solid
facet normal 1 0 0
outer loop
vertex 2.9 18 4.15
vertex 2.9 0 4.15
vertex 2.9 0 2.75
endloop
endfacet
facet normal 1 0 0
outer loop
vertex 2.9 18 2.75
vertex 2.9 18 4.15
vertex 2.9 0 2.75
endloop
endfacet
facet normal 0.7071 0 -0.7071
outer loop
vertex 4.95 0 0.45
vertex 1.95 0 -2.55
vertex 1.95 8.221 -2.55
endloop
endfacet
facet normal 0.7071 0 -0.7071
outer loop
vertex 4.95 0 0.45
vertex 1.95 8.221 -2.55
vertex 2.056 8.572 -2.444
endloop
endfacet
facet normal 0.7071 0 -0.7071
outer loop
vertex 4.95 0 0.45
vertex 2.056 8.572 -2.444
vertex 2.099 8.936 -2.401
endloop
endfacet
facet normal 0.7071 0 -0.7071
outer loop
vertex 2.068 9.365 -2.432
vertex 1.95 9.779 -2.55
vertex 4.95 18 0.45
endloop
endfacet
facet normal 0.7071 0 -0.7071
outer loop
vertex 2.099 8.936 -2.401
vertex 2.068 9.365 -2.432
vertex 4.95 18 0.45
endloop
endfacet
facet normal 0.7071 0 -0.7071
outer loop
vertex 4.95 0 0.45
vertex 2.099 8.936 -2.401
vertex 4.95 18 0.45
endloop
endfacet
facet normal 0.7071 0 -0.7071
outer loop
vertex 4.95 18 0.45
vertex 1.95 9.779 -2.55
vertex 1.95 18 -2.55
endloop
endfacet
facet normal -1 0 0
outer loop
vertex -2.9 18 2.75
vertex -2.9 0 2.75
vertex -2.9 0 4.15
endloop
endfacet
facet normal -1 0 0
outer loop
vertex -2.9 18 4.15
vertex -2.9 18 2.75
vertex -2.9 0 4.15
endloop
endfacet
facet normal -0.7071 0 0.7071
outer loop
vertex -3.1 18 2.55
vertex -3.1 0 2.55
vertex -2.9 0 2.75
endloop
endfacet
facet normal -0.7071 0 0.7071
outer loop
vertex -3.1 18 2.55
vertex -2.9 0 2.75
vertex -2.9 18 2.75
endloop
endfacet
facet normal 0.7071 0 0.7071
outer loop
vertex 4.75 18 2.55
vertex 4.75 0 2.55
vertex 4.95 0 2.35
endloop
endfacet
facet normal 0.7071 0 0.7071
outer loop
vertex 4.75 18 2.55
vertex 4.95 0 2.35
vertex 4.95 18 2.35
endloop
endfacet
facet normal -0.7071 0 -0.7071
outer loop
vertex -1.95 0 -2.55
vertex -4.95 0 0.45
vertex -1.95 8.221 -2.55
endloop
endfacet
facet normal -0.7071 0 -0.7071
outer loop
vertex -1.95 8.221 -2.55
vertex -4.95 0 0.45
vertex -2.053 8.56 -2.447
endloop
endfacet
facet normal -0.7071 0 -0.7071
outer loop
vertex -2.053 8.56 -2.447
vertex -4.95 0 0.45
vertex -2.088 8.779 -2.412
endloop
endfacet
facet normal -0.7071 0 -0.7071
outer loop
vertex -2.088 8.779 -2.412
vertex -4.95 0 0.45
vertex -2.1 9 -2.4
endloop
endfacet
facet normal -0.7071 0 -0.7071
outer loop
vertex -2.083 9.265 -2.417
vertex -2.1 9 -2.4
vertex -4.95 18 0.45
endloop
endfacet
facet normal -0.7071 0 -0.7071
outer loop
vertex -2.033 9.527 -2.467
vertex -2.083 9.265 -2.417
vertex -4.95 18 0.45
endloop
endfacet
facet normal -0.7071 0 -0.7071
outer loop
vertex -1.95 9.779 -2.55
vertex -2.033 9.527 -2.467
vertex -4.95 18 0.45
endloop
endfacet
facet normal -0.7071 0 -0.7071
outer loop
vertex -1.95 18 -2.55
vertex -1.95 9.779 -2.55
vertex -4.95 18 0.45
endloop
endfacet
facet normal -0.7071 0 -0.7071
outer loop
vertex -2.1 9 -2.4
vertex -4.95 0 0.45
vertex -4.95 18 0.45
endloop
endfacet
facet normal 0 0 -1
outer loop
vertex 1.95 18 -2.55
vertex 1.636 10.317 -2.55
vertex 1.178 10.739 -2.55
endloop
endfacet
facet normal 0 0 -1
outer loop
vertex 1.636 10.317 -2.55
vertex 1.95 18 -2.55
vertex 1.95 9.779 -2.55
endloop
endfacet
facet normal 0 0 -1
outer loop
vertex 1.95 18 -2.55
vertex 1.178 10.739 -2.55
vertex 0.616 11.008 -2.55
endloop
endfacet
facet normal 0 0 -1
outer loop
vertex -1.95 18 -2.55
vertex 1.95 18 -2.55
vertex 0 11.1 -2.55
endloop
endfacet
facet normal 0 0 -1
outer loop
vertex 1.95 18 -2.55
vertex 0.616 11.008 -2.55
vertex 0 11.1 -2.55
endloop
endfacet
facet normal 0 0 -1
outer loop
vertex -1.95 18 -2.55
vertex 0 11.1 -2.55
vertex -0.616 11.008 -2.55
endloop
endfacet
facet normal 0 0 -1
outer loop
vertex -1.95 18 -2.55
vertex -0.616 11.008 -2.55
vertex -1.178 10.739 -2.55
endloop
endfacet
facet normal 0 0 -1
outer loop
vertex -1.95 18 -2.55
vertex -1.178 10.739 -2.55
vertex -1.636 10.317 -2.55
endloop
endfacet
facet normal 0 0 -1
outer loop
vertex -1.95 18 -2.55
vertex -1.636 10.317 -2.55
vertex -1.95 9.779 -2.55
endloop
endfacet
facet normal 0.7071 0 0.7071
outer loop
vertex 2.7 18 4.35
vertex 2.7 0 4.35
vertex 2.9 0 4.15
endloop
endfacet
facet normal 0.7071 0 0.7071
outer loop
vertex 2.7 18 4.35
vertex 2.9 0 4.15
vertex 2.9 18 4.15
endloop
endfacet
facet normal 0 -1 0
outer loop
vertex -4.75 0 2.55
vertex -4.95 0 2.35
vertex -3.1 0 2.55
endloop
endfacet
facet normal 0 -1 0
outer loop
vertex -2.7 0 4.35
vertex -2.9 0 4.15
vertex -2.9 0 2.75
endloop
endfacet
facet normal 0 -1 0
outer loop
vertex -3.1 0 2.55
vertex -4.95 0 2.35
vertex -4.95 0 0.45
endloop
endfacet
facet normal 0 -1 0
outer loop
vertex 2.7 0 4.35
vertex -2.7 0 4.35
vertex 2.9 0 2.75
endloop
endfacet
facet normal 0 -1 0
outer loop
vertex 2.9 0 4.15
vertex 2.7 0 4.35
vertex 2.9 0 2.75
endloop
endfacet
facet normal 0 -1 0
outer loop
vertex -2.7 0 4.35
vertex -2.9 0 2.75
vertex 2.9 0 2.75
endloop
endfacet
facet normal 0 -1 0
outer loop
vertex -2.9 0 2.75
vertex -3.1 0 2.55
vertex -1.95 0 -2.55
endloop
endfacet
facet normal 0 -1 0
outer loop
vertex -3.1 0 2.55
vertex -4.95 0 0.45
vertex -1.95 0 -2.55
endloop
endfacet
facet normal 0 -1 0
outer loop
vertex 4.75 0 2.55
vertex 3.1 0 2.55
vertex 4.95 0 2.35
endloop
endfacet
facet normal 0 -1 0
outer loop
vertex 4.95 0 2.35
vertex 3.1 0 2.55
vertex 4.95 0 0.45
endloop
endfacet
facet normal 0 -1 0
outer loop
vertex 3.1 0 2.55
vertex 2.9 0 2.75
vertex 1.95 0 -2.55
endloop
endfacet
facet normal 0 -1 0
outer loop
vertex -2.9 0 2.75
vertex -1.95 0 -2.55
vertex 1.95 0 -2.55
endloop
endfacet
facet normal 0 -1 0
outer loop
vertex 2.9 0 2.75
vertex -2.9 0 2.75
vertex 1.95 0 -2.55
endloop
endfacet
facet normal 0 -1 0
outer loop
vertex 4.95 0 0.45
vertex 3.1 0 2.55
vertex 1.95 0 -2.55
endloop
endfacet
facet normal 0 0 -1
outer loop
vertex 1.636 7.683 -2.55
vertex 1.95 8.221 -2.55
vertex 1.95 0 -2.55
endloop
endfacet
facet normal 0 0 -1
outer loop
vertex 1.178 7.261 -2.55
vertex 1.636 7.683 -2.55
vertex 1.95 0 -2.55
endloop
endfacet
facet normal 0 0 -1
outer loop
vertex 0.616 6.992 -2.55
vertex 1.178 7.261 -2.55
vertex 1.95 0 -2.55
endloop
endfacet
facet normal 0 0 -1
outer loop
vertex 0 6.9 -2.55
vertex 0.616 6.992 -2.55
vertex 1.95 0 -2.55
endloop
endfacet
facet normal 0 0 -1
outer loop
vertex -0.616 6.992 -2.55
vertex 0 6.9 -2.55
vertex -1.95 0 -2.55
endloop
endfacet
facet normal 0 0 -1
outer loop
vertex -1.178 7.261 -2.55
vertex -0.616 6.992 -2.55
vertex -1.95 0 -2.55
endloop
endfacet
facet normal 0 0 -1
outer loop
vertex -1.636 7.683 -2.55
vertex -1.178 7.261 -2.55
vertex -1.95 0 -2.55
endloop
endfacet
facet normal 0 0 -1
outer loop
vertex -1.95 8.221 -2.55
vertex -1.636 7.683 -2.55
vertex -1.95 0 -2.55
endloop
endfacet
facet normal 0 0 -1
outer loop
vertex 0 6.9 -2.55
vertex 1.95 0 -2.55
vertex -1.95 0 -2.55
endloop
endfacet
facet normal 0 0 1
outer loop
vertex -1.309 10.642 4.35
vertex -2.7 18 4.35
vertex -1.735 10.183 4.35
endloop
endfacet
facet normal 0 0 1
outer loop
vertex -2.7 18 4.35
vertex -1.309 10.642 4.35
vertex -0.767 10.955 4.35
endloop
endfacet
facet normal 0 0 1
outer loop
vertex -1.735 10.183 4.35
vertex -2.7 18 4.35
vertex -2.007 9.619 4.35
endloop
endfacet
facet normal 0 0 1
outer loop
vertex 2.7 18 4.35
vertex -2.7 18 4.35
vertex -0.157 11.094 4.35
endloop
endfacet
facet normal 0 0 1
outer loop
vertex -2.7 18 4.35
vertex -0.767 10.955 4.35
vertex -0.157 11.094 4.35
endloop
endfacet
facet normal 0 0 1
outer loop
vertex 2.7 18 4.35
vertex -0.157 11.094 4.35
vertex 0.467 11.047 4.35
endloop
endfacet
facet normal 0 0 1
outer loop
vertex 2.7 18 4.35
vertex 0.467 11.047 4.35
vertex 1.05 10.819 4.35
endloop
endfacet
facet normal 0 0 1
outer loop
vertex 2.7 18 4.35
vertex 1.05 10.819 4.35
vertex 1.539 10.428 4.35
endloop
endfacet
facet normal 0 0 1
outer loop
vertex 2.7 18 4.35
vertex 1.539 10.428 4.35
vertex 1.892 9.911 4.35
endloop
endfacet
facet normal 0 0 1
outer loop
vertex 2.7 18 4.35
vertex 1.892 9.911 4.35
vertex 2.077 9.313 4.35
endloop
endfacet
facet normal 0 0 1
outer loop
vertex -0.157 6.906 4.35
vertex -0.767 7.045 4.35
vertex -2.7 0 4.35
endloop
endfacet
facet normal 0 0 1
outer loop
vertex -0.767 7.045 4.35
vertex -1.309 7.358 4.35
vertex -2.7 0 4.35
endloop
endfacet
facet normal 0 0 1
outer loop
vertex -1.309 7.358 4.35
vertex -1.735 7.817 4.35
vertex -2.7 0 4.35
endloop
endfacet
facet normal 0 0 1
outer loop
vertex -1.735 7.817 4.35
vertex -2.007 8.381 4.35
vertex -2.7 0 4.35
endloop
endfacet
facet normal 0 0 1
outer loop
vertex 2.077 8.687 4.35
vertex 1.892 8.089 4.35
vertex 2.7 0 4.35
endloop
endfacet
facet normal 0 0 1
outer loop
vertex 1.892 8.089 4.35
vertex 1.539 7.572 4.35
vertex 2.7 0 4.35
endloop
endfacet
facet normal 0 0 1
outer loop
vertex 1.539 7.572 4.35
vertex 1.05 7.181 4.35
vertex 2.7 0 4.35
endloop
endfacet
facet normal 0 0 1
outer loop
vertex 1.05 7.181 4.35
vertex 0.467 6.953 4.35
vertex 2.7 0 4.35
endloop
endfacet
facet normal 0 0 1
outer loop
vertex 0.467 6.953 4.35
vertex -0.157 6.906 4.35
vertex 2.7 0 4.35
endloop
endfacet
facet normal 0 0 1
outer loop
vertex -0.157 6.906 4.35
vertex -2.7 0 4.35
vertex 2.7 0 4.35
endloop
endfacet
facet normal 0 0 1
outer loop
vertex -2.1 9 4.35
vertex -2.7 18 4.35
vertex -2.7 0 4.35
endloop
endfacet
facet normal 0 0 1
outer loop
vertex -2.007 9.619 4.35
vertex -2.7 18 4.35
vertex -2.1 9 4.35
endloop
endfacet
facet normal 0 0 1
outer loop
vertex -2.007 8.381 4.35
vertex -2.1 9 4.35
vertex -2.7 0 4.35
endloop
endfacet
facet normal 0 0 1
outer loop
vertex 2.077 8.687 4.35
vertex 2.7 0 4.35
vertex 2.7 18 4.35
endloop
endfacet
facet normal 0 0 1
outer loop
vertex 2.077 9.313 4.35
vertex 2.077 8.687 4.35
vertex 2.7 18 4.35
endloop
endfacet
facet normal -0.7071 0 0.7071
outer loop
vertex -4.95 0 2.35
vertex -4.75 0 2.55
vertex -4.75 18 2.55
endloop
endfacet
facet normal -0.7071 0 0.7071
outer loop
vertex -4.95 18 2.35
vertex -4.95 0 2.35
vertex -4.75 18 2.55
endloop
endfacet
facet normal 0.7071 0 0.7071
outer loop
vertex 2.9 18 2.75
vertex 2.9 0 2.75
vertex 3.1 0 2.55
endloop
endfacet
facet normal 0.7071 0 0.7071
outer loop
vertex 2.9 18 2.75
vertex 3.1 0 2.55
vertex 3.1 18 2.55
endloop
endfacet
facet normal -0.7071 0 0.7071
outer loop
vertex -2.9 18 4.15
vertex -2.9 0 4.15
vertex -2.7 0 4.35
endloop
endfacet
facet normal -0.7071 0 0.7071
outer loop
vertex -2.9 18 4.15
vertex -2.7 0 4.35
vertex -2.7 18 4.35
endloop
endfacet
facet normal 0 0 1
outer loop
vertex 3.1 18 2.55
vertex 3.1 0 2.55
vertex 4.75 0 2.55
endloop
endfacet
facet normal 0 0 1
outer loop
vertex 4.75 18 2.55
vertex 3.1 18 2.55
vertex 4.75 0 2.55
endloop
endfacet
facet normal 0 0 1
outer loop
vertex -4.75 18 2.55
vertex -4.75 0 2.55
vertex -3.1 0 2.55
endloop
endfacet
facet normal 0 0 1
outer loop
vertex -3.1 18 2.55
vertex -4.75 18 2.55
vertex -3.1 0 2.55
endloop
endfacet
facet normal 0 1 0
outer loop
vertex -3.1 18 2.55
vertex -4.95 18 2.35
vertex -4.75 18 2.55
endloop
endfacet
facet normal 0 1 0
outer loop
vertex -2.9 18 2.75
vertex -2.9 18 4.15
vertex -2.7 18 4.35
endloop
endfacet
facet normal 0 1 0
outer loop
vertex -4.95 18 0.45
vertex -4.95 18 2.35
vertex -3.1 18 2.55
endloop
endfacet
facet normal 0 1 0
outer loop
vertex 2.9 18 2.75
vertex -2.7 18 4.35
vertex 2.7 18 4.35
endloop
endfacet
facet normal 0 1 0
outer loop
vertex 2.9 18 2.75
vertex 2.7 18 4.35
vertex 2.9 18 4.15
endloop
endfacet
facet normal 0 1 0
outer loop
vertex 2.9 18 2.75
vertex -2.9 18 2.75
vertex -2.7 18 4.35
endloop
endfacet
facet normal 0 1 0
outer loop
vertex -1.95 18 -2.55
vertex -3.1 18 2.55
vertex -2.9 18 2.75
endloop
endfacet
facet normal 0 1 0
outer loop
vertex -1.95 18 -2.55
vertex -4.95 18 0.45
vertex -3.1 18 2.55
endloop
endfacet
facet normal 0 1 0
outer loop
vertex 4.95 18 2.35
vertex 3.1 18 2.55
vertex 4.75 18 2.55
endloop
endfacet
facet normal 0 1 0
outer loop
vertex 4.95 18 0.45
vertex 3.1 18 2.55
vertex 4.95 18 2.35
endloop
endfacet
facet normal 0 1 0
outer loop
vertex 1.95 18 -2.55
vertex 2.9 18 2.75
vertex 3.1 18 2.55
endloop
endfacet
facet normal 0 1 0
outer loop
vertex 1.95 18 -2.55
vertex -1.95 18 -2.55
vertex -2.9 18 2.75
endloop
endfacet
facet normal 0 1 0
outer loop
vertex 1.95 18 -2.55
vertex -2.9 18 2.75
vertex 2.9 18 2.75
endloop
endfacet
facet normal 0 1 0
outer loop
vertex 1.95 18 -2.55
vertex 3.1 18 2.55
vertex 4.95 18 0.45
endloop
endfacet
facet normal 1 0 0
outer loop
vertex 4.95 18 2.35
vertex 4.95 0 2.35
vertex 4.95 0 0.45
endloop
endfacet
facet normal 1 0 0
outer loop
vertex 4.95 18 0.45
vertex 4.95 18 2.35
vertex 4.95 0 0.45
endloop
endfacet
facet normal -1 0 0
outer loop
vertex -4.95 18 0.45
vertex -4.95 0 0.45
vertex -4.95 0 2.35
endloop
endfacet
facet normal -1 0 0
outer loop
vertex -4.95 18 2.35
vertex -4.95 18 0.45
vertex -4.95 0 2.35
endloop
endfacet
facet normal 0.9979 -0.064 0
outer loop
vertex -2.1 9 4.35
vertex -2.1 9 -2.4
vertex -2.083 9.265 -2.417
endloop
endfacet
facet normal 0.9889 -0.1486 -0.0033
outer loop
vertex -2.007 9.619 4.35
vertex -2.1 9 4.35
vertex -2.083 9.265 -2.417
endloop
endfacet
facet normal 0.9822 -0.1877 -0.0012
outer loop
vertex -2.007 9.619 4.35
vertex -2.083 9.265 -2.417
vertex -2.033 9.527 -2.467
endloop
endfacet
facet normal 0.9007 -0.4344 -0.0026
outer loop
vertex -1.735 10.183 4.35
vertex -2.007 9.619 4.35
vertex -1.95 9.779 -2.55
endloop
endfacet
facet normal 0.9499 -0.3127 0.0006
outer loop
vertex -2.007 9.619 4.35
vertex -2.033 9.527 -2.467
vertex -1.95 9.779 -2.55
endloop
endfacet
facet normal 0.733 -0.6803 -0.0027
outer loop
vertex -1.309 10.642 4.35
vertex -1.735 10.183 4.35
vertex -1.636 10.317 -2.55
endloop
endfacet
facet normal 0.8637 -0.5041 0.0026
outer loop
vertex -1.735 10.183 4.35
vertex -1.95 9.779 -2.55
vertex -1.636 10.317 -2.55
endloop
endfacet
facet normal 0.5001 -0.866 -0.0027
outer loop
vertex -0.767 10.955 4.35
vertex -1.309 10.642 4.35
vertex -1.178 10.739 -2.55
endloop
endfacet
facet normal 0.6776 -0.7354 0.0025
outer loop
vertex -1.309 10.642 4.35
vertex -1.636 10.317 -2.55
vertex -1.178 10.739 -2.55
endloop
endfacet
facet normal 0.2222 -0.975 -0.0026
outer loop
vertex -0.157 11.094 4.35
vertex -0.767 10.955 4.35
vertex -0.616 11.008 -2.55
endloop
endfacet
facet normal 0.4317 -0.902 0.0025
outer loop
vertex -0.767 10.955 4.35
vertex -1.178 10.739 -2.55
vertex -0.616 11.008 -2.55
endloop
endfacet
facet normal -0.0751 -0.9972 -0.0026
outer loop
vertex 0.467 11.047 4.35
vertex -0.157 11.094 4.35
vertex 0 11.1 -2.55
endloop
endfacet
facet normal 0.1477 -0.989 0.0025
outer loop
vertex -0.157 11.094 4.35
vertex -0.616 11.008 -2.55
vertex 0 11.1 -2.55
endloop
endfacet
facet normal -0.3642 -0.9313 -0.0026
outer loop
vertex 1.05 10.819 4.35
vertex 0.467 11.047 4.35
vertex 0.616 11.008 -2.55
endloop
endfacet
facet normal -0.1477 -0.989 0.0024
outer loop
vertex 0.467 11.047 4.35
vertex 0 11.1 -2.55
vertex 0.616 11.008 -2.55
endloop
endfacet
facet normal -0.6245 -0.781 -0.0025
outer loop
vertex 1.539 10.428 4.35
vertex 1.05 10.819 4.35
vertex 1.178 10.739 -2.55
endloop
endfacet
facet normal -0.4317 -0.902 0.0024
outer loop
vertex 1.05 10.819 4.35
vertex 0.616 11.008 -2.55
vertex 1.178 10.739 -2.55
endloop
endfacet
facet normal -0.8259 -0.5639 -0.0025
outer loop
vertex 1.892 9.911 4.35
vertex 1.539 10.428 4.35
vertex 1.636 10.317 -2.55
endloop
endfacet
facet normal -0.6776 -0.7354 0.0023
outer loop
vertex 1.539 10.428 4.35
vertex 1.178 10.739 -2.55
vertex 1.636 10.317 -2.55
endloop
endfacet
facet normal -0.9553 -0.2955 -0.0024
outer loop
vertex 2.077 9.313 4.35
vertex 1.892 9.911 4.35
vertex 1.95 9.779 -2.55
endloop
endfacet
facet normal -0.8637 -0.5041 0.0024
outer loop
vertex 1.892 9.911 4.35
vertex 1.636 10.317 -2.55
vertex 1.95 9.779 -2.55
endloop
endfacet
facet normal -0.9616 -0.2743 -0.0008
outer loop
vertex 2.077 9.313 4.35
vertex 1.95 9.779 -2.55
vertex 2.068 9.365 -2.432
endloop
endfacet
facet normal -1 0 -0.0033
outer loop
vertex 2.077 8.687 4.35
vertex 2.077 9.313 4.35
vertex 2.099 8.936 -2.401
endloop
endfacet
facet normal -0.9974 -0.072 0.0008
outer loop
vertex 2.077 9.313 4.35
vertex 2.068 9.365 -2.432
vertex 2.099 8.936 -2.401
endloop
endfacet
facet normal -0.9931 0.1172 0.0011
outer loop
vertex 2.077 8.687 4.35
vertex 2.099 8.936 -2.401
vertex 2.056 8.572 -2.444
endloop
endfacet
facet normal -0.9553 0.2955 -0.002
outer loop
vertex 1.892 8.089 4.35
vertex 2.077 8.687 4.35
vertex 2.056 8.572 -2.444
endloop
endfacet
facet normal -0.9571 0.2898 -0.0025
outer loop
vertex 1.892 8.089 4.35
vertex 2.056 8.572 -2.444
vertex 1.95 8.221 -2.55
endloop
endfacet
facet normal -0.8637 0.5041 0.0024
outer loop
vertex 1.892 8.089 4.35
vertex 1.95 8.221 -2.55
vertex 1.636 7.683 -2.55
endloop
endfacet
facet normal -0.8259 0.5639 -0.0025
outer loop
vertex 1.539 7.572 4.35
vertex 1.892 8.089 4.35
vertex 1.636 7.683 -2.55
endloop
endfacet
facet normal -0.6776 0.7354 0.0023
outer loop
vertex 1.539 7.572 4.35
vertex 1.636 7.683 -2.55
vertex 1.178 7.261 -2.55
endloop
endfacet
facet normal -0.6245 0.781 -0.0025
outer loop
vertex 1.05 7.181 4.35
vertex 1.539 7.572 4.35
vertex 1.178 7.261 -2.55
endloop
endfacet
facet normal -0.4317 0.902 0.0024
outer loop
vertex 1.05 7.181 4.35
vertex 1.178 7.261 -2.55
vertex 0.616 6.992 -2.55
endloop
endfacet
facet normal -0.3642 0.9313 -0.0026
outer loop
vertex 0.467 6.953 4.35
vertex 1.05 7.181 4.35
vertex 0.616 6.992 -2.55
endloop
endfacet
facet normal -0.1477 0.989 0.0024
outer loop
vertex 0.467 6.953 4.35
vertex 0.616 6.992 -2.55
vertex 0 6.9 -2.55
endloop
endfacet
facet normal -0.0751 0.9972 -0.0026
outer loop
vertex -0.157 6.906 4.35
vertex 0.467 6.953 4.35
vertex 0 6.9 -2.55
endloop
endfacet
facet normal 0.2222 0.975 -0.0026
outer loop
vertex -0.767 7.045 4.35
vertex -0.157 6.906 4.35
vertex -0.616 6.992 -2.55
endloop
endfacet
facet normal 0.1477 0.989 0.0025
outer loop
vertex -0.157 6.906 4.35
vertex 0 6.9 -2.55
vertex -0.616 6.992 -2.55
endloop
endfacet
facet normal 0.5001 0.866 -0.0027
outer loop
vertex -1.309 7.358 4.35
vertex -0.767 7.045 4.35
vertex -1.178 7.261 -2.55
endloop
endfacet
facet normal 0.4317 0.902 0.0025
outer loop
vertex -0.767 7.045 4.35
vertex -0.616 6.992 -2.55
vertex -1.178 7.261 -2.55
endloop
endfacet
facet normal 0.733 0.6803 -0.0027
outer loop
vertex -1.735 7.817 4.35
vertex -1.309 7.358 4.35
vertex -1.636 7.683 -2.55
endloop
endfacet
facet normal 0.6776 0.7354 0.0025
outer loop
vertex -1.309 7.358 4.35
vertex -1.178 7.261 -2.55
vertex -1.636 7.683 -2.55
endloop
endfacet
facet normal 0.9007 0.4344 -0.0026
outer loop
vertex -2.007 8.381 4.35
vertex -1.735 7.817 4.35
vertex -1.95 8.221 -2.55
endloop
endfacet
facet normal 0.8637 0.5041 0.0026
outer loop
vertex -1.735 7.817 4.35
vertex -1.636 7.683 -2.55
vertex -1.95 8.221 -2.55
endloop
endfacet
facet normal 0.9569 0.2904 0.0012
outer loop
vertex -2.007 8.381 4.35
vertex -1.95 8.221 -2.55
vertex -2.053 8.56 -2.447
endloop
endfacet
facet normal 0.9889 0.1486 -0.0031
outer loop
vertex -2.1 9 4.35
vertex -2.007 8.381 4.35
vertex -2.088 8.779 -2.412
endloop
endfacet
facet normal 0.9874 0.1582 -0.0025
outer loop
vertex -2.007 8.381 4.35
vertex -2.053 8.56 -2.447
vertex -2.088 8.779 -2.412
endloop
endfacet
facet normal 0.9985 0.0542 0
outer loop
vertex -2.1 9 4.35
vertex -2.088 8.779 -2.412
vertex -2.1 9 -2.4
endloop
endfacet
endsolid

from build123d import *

# Parameters (mm, degrees)
EXTRUDE_1_DEPTH    = 18
CHAMFER_1_SIZE     = 3
CHAMFER_2_SIZE     = 0.2
HOLE_WIZARD_M5_1_D = 4.2


with BuildPart() as part:
    # 草图1 → 凸台-拉伸1 (new body)
    with BuildSketch(Plane(origin=(0, 0, 0), x_dir=(1, 0, 0), z_dir=(0, 1, 0))):
        Polygon((2.9, -2.55), (4.95, -2.55), (4.95, 2.55), (-4.95, 2.55), (-4.95, -2.55), (-2.9, -2.55), (-2.9, -4.35), (2.9, -4.35), align=None)
    extrude(amount=EXTRUDE_1_DEPTH)

    # 倒角1
    chamfer_1_edges = [part.edges().sort_by_distance(p)[0] for p in [
        (-4.95, 9, -2.55),
        (4.95, 9, -2.55),
    ]]
    chamfer(chamfer_1_edges, length=CHAMFER_1_SIZE)

    # 倒角2
    chamfer_2_edges = [part.edges().sort_by_distance(p)[0] for p in [
        (4.95, 9, 2.55),
        (2.9, 9, 2.55),
        (2.9, 9, 4.35),
        (-2.9, 9, 4.35),
        (-2.9, 9, 2.55),
        (-4.95, 9, 2.55),
    ]]
    chamfer(chamfer_2_edges, length=CHAMFER_2_SIZE)

    # M5 螺纹孔1 (through all)
    with Locations(Plane.XY.offset(4.35)):
        with Locations((0, 9)):
            Hole(HOLE_WIZARD_M5_1_D / 2)


solid = part.part
